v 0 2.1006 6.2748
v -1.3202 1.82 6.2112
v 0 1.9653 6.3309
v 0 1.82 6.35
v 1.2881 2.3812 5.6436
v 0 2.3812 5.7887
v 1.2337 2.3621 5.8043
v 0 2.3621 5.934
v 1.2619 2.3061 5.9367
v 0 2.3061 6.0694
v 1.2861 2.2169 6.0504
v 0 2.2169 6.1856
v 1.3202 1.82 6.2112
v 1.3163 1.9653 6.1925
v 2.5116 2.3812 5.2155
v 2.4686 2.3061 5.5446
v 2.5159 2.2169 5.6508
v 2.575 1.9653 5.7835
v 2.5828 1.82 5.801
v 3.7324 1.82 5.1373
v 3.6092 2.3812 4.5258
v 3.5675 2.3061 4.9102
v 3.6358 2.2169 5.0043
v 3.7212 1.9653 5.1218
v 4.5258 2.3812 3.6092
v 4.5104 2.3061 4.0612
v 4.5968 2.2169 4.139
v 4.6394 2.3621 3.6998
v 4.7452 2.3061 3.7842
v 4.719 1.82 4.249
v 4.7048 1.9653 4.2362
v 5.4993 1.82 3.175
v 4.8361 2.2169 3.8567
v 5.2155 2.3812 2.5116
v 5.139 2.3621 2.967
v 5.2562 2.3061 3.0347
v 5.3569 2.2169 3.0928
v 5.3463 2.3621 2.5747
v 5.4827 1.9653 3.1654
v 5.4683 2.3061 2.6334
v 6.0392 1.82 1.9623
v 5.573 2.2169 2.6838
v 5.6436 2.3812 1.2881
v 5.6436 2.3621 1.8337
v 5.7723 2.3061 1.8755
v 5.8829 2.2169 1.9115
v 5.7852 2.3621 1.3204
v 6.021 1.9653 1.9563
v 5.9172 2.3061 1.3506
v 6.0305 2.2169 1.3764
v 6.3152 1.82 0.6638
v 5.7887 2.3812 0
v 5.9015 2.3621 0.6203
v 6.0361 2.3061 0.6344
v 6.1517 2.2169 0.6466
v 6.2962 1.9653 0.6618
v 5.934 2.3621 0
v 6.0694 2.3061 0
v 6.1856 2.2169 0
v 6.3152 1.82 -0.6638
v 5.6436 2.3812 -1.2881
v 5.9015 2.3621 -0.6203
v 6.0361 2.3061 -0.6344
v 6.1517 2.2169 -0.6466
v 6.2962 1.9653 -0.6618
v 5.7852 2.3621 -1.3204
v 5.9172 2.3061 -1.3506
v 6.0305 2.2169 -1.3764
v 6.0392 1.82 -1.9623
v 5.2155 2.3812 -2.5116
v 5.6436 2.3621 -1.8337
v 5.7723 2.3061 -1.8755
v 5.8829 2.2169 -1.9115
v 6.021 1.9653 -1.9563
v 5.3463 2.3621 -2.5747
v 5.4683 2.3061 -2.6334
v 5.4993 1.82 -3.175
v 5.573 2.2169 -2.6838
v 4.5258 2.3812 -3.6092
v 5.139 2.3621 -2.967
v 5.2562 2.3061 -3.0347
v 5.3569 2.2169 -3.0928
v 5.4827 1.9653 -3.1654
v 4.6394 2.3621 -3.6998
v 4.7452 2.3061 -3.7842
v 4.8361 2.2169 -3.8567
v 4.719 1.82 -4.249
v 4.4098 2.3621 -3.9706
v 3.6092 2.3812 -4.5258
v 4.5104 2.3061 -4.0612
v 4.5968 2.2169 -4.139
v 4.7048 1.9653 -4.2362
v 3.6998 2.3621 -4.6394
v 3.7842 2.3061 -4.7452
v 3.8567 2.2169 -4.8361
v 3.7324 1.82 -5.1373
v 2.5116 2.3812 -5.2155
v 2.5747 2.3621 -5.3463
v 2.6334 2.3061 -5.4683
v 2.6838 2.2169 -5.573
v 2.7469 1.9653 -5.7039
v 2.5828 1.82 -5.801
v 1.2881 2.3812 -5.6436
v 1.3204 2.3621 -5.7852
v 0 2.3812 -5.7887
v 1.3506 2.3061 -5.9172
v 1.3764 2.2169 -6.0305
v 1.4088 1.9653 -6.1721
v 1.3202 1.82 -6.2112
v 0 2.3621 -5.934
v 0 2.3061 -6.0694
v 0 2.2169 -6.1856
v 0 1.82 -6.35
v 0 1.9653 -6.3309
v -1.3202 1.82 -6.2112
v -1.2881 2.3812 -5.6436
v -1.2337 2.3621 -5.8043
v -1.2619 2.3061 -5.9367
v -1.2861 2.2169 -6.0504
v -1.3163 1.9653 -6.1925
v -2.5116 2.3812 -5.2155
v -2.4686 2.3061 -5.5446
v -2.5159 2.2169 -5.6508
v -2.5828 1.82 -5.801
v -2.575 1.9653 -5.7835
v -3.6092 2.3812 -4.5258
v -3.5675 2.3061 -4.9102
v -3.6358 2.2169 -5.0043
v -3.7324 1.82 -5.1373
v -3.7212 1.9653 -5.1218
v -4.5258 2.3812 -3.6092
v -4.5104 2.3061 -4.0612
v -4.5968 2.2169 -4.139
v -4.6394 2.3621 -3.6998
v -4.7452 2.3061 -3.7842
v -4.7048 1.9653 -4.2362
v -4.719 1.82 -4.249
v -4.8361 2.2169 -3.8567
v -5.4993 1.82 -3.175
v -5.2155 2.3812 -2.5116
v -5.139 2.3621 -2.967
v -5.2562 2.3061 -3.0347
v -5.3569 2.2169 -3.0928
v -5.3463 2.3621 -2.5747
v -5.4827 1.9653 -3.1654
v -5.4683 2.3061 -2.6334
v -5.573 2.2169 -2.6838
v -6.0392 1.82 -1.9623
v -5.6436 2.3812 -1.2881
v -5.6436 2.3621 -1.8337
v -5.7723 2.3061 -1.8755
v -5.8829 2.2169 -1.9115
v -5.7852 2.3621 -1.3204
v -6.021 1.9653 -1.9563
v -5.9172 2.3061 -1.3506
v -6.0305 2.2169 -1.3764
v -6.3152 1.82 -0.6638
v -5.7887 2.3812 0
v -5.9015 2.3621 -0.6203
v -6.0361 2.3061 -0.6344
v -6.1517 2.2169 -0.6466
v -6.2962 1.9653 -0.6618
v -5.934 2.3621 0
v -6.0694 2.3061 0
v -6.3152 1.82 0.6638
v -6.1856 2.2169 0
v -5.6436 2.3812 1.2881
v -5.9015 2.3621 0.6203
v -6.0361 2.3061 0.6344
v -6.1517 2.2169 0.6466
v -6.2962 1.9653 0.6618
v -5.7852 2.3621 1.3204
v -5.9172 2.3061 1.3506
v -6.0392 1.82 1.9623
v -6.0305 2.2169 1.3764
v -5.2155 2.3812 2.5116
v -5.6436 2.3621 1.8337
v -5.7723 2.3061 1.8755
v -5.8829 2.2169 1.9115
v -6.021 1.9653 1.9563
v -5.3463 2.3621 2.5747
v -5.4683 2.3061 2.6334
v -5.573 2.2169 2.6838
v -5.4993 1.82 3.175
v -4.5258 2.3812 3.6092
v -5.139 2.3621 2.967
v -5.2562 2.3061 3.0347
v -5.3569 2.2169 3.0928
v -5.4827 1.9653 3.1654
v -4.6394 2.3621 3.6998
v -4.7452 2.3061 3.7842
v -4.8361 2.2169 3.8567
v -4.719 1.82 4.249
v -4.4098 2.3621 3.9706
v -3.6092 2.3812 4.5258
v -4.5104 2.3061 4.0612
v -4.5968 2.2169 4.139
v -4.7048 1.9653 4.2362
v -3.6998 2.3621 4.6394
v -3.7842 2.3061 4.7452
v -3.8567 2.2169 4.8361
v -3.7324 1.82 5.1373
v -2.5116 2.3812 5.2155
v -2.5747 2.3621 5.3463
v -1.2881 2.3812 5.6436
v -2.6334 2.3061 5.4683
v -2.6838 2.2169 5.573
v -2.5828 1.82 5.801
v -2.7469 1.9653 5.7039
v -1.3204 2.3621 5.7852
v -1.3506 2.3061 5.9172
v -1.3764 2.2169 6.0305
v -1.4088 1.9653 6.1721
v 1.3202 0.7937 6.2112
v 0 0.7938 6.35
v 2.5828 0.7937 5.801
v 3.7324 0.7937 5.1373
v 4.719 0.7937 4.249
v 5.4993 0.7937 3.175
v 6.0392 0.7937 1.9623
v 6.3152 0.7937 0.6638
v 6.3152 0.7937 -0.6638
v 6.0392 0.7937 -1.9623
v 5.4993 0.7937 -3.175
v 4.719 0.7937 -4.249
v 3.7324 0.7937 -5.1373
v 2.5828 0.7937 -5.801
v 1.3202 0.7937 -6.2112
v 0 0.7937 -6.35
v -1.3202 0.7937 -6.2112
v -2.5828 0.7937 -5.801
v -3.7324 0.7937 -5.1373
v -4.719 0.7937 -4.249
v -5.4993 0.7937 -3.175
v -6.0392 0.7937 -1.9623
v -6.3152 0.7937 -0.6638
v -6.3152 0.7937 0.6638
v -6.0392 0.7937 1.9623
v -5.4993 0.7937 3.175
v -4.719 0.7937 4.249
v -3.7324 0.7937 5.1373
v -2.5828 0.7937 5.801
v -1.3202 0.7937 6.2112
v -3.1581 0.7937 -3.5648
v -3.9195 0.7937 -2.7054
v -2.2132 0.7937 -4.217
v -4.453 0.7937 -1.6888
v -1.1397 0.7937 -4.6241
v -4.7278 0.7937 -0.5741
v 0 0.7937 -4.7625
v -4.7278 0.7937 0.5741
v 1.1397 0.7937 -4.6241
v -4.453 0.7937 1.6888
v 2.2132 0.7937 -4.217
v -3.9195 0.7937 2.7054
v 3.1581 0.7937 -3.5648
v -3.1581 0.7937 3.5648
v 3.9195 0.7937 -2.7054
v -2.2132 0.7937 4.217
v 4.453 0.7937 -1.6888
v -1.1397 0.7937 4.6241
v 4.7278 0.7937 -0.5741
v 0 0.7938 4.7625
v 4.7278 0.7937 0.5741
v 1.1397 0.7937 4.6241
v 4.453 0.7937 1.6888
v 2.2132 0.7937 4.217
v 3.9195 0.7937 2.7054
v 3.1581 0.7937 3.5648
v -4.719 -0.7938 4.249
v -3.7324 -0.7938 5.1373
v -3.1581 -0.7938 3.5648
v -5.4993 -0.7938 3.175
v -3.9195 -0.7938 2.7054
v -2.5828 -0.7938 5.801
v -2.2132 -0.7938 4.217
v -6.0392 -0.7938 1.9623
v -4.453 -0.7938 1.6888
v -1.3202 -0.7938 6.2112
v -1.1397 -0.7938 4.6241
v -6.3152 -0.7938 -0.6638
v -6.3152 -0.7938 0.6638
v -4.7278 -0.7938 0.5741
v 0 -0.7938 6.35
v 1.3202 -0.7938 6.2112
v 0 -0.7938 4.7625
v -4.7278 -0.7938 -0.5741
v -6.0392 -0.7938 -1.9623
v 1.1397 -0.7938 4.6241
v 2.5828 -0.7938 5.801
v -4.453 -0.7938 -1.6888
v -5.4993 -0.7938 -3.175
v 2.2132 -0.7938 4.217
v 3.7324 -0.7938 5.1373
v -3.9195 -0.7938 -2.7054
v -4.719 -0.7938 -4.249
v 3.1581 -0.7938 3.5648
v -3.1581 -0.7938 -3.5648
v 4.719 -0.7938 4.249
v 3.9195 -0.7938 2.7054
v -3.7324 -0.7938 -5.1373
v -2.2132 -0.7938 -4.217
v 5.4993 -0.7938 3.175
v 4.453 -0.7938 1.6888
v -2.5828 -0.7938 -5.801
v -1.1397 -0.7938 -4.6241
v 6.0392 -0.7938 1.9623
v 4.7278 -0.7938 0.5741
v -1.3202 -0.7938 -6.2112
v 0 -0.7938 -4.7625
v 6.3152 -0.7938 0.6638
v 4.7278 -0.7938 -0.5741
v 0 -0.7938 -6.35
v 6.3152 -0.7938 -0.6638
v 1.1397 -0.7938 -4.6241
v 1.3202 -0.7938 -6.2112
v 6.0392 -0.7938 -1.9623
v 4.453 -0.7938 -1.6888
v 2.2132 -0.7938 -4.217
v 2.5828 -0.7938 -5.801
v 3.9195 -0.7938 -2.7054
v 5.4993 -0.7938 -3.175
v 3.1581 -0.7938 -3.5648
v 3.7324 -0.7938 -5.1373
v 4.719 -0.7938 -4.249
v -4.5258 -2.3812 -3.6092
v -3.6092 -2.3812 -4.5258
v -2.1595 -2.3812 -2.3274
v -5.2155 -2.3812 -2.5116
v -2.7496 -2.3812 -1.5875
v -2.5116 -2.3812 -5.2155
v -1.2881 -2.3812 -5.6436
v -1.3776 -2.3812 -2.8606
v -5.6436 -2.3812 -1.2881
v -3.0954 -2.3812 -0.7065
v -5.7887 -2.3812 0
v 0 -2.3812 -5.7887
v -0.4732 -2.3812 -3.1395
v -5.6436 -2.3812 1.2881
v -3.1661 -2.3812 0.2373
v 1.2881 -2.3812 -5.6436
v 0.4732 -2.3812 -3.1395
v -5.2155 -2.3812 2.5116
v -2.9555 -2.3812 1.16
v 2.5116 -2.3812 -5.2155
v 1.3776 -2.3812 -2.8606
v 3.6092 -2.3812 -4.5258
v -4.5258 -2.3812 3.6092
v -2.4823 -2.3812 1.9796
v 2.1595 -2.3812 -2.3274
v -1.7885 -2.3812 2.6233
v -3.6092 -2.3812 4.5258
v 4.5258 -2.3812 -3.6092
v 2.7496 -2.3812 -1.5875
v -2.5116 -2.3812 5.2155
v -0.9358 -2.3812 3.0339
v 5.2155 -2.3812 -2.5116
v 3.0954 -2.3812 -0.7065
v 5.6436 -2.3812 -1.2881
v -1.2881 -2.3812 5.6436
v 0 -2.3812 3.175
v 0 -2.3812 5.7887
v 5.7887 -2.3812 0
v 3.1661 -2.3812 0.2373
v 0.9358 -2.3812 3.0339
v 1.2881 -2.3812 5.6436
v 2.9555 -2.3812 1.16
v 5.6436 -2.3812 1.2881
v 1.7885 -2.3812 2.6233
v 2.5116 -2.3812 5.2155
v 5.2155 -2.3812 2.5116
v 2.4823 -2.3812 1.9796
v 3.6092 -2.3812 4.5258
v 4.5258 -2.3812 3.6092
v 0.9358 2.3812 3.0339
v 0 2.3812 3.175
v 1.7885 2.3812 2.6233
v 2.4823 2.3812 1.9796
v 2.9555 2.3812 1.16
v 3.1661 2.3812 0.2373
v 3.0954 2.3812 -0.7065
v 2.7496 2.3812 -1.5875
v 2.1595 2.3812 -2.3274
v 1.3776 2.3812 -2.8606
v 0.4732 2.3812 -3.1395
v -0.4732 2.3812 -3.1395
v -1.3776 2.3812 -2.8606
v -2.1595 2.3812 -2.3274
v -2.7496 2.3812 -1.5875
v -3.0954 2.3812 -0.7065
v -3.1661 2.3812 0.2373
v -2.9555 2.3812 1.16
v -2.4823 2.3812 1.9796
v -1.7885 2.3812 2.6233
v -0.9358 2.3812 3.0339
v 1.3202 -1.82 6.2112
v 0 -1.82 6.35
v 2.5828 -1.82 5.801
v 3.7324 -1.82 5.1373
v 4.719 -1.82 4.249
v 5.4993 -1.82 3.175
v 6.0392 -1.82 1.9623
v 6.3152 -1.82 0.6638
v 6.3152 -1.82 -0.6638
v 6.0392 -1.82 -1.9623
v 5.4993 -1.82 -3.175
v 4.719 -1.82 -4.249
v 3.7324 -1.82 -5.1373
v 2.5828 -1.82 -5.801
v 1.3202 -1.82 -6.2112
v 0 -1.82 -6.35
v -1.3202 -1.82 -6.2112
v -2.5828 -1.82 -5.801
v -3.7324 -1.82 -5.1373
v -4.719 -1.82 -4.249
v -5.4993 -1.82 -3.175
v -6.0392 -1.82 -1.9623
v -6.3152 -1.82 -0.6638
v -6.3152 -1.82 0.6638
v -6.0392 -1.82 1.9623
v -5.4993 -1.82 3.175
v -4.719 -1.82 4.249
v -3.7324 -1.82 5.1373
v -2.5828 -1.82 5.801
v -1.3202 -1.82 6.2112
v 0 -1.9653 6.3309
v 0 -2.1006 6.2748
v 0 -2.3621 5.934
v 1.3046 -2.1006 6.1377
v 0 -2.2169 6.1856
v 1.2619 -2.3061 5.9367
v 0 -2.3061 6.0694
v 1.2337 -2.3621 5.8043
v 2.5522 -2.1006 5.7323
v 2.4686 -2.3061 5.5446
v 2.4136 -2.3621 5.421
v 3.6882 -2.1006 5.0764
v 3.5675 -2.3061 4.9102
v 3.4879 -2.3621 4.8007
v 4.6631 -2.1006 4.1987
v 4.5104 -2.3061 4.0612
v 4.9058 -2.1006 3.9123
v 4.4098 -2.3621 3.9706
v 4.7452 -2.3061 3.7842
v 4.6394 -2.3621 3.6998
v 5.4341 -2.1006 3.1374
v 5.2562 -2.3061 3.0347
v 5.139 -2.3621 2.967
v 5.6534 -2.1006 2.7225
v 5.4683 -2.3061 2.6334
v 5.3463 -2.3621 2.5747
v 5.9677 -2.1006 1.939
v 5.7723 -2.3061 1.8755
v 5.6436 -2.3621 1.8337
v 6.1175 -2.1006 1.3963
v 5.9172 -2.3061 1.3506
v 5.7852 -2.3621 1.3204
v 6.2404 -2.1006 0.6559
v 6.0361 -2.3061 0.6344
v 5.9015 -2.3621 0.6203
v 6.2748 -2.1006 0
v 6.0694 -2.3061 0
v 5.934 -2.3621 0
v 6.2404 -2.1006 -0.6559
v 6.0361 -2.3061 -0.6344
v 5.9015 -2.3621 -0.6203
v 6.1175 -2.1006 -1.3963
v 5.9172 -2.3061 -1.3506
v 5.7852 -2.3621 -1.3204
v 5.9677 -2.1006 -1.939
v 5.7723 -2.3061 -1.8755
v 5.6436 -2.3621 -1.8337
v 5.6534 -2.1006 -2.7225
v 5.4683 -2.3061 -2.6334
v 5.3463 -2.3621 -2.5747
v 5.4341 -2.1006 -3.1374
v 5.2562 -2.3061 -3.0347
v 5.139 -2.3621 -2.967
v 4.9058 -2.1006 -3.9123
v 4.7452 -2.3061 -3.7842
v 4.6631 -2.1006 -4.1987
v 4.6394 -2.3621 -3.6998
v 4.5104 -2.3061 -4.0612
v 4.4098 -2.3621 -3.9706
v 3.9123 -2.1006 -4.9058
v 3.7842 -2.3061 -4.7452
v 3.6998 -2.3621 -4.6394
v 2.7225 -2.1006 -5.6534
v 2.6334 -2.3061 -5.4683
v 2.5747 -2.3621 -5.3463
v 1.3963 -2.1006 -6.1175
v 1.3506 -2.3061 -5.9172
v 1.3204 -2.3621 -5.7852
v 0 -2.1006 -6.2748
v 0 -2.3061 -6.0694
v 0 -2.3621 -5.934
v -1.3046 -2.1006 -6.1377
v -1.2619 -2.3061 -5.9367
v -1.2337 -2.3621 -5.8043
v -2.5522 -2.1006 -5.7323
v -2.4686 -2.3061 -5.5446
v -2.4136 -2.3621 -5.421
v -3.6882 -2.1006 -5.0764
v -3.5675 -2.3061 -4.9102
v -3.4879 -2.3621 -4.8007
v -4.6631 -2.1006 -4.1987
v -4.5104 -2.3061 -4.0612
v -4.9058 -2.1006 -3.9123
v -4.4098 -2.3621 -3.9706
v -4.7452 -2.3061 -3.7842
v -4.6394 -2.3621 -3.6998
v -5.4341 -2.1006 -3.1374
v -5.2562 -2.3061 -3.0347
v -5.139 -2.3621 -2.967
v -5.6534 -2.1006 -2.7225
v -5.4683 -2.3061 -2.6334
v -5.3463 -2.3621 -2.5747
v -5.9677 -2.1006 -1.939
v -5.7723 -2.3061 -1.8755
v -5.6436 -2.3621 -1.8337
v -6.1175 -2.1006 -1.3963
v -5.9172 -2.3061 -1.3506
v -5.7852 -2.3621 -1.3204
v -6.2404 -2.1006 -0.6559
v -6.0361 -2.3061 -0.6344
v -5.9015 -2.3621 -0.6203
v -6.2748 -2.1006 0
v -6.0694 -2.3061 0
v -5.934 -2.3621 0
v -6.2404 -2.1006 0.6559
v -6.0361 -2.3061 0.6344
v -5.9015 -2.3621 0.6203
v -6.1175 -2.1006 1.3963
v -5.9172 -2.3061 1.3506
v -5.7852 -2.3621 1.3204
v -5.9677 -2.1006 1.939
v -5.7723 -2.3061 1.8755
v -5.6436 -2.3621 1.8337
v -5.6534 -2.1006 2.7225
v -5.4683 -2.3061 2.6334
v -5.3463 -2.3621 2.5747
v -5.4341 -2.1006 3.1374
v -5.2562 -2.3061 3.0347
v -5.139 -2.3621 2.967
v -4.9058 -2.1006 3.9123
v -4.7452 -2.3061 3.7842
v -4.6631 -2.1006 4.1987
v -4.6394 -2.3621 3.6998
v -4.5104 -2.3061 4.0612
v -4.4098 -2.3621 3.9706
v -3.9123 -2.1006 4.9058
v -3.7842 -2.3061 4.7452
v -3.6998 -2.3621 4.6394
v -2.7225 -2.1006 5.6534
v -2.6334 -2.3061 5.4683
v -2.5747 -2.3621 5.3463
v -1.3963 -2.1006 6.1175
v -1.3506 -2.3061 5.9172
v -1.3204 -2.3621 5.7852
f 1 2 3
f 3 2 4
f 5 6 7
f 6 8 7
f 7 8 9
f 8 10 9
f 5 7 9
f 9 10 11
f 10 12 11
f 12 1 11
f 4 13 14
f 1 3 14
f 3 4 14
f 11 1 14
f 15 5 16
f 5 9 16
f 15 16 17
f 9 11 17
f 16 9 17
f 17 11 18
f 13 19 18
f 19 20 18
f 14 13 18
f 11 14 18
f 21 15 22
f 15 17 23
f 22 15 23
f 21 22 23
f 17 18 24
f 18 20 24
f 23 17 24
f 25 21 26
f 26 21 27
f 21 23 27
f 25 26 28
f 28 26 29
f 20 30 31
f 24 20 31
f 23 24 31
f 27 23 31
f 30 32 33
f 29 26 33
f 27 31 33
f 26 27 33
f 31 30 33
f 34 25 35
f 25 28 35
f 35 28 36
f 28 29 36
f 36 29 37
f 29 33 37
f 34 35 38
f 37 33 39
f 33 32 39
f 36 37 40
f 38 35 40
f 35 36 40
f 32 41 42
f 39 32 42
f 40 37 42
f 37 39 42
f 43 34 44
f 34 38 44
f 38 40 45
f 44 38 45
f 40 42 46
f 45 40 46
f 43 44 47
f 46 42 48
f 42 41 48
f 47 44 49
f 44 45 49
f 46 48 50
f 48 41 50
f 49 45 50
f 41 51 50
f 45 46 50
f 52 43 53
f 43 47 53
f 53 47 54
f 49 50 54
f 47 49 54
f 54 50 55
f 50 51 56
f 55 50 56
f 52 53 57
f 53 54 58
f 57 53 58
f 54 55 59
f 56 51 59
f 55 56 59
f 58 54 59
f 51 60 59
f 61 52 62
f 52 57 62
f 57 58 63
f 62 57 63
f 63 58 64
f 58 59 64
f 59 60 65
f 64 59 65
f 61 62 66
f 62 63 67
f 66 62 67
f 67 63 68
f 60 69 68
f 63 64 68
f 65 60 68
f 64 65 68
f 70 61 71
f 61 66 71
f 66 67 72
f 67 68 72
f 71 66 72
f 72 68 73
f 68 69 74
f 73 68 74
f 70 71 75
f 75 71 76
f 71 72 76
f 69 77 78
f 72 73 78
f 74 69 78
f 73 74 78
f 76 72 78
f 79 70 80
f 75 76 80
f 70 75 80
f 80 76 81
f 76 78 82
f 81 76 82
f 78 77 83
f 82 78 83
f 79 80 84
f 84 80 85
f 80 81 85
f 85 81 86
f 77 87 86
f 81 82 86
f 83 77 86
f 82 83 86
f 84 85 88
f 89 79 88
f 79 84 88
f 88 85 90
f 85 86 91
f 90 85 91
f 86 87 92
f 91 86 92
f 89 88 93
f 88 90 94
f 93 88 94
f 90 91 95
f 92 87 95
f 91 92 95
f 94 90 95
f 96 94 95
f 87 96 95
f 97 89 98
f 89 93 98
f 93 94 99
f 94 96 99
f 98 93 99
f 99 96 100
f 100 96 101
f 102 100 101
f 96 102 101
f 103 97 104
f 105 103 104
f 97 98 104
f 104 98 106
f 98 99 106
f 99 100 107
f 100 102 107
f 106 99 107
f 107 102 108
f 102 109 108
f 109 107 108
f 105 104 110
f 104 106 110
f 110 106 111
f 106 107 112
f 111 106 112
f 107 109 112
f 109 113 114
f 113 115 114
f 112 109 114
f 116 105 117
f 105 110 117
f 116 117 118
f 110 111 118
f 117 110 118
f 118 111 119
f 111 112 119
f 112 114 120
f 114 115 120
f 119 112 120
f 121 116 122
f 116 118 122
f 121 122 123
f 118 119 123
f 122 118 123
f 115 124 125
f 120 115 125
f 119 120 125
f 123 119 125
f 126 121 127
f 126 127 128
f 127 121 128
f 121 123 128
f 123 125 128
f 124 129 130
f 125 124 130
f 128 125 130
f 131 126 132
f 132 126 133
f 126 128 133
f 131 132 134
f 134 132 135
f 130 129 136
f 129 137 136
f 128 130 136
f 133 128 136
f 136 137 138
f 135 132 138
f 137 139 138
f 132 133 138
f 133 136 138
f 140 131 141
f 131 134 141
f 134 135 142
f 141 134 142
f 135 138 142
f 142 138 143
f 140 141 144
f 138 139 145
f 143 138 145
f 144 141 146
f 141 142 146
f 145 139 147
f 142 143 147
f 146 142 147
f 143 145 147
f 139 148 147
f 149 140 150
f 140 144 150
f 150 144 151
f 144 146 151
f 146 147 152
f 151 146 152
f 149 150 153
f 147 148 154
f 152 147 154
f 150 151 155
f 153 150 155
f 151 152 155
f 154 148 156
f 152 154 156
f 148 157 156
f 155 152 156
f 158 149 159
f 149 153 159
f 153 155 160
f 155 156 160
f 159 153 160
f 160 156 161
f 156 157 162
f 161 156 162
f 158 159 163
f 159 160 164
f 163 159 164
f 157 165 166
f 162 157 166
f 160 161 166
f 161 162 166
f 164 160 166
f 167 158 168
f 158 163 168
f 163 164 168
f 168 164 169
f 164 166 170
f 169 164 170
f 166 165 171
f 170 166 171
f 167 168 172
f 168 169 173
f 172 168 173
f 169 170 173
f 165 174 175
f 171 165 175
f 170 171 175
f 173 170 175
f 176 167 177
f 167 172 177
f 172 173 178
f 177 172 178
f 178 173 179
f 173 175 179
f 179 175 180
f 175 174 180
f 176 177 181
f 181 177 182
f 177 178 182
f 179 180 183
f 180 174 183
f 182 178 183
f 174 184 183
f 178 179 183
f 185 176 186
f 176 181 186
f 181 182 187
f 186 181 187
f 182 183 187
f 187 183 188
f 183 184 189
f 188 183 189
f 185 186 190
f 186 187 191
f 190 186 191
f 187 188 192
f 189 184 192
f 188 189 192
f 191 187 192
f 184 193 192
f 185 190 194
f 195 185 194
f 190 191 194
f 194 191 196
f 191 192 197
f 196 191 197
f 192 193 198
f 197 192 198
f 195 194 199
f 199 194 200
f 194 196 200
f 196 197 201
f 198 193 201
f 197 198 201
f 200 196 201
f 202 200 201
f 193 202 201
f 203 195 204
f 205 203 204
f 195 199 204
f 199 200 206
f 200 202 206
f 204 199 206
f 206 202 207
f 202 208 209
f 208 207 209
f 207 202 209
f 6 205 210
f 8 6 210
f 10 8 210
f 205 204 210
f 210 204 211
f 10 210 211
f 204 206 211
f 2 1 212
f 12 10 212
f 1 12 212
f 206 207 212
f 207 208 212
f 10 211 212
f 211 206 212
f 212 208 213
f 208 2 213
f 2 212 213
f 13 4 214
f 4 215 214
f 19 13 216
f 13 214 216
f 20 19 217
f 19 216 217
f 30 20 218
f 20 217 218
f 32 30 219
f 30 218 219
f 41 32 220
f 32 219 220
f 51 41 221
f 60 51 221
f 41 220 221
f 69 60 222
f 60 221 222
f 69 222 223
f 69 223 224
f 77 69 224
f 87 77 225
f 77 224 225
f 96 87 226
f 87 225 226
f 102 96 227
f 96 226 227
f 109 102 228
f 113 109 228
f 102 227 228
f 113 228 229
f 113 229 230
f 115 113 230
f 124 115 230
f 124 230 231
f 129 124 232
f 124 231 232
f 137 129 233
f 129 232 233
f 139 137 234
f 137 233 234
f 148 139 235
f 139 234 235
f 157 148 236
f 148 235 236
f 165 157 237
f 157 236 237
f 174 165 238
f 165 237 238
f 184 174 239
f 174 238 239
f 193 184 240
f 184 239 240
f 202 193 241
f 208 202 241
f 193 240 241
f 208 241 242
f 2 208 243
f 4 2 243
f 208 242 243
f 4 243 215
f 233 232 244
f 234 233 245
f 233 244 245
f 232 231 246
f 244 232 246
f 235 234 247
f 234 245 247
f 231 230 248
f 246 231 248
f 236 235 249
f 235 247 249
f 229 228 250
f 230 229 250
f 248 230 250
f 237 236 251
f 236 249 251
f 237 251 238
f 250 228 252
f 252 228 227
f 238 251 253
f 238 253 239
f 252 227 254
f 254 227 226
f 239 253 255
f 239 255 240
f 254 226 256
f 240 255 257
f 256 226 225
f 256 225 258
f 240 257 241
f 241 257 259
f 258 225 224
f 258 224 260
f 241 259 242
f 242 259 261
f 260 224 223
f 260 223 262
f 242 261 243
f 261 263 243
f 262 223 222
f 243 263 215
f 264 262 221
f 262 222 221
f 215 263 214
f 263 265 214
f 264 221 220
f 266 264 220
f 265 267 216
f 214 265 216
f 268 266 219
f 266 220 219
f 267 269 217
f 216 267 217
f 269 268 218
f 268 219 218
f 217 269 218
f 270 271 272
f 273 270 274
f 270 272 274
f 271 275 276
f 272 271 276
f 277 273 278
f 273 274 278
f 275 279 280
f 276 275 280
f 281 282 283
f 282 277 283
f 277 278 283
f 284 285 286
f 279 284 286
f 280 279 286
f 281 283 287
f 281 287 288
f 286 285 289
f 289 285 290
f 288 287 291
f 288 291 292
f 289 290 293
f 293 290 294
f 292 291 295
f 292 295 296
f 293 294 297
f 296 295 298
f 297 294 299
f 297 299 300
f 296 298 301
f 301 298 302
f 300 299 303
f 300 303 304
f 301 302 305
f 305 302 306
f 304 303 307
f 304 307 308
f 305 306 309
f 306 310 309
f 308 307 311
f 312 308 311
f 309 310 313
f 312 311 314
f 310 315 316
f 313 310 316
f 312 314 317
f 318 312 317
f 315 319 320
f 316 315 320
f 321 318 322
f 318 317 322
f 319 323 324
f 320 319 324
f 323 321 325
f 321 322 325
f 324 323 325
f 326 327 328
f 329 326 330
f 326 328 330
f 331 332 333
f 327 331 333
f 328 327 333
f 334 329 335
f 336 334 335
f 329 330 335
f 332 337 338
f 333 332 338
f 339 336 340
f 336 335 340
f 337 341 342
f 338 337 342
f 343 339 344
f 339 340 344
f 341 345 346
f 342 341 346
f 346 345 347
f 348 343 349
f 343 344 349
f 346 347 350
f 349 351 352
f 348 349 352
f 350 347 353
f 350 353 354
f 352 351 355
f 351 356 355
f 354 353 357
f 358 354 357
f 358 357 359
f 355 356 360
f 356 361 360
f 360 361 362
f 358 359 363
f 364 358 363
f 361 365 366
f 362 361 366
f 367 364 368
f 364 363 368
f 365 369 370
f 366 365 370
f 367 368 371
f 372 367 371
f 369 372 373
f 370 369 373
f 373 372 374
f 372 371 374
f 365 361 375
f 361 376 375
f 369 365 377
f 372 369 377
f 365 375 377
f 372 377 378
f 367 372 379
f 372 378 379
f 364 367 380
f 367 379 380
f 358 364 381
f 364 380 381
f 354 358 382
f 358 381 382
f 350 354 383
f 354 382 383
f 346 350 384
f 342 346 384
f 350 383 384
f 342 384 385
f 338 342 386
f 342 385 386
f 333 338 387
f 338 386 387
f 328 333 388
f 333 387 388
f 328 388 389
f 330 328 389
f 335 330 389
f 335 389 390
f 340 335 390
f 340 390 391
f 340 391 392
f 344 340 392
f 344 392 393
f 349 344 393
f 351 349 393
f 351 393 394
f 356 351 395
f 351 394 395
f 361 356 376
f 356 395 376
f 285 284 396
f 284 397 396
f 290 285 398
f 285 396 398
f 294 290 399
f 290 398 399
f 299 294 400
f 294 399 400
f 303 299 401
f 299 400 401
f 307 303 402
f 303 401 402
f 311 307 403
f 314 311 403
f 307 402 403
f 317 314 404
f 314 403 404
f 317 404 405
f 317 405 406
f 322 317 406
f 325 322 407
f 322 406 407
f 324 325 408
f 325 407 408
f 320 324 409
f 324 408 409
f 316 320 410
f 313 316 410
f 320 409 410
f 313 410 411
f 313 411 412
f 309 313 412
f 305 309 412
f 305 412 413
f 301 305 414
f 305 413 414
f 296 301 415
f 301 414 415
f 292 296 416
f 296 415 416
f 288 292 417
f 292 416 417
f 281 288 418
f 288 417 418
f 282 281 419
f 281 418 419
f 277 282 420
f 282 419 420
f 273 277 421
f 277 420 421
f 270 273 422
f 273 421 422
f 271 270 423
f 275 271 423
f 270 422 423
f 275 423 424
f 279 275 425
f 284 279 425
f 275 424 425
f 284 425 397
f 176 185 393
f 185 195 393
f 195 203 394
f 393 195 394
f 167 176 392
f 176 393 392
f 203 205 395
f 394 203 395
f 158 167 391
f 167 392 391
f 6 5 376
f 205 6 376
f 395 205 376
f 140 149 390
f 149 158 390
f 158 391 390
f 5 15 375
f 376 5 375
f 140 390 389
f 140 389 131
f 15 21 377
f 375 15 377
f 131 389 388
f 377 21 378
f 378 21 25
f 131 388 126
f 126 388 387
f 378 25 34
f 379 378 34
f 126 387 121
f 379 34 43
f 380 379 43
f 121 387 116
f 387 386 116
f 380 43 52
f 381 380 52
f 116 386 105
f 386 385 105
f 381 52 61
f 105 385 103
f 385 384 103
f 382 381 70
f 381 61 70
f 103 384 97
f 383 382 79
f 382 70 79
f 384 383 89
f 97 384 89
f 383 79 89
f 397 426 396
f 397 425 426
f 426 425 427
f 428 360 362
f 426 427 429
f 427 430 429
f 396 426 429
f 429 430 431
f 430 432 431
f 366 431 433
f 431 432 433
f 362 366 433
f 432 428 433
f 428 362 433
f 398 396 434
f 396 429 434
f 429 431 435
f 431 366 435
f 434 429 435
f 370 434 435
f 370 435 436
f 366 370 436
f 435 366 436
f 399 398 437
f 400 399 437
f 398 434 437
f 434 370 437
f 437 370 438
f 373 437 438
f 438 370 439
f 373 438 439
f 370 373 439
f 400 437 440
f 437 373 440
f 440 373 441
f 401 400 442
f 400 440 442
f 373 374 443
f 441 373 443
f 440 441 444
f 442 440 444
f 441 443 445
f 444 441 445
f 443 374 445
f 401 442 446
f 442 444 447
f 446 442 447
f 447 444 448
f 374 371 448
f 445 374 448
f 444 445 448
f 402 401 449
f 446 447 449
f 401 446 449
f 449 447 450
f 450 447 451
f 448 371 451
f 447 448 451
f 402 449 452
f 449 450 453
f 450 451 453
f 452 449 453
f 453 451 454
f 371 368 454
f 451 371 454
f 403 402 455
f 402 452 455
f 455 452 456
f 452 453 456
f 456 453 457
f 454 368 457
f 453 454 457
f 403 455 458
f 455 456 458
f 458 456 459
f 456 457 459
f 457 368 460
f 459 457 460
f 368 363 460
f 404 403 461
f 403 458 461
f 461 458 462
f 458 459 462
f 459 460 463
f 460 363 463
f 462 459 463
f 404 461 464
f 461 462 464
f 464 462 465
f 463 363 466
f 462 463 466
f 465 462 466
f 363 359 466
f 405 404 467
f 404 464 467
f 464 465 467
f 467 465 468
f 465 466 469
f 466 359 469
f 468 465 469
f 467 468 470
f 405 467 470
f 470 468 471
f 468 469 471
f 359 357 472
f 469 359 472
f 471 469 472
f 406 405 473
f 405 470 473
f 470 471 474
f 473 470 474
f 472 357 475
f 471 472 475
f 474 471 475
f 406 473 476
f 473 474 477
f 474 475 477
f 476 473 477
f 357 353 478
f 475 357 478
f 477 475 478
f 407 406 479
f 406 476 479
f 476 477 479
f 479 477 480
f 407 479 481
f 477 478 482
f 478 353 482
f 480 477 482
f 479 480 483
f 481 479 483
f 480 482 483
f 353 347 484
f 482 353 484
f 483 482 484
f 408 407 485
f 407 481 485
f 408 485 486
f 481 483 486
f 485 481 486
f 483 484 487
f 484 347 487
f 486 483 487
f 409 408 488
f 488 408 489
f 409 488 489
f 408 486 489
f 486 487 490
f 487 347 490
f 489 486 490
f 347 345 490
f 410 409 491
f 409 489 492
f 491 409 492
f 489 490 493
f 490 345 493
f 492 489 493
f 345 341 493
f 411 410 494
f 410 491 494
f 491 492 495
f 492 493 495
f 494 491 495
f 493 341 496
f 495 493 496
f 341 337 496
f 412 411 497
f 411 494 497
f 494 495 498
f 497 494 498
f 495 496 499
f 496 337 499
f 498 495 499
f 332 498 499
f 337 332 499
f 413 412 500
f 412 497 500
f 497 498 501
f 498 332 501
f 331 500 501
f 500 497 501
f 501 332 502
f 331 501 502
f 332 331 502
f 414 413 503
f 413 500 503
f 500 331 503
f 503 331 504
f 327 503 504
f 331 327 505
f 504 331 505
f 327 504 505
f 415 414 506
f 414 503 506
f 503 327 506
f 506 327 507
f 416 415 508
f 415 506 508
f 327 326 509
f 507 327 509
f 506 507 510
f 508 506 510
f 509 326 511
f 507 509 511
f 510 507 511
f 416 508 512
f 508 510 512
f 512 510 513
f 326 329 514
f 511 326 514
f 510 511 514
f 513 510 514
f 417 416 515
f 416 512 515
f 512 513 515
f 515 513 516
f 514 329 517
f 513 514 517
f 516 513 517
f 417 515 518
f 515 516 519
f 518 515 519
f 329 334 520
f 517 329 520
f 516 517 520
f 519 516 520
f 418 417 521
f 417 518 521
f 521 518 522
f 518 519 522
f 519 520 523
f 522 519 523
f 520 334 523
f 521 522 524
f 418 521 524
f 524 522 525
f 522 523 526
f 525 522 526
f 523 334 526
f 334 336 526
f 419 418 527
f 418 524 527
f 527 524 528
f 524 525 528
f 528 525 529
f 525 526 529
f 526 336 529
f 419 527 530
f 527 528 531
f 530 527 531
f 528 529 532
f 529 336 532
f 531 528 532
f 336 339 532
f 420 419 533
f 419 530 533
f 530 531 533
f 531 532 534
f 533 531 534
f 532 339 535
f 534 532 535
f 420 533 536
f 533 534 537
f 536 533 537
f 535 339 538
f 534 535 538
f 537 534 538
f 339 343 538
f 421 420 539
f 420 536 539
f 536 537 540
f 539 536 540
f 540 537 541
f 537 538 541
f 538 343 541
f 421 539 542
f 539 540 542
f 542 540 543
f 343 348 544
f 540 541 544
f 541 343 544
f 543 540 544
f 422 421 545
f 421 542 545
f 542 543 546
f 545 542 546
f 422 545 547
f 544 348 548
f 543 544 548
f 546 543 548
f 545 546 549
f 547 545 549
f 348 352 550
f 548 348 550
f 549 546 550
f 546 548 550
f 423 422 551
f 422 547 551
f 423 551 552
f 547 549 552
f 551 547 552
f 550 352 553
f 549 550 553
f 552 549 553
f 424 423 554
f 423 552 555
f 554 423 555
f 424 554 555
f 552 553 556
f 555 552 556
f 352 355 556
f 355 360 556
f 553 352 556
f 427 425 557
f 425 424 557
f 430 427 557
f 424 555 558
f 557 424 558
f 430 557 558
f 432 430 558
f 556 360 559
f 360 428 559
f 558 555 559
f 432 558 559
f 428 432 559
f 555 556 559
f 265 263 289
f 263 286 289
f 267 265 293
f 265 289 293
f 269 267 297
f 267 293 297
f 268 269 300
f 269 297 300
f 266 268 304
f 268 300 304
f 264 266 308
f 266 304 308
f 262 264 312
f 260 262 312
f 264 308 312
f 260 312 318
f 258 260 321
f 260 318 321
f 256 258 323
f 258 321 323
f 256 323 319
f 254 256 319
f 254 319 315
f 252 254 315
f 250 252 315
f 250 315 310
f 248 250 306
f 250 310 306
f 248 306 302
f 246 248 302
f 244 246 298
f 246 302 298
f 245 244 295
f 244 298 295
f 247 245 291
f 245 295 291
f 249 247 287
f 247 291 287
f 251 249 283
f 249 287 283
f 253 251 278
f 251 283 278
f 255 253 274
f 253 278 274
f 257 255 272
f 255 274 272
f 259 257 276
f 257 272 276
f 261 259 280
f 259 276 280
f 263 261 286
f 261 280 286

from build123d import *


with BuildPart() as part:
    # Sketch15 → Revolve4 (revolve)
    with BuildSketch(Plane.XY, mode=Mode.PRIVATE) as revolve4_sk:
        with BuildLine():
            Line((-3.175, -2.38125), (-3.175, 2.38125))
            Line((-3.175, 2.38125), (-5.788733992, 2.38125))
            ThreePointArc((-5.788733992, 2.38125), (-6.185608992, 2.216858992), (-6.35, 1.819983992))
            Line((-6.35, 1.819983992), (-6.35, 0.79375))
            Line((-6.35, 0.79375), (-4.7625, 0.79375))
            Line((-4.7625, 0.79375), (-4.7625, -0.79375))
            Line((-4.7625, -0.79375), (-6.35, -0.79375))
            Line((-6.35, -0.79375), (-6.35, -1.819983992))
            ThreePointArc((-6.35, -1.819983992), (-6.185608992, -2.216858992), (-5.788733992, -2.38125))
            Line((-5.788733992, -2.38125), (-3.175, -2.38125))
        make_face()
    revolve(revolve4_sk.sketch.rotate(Axis((0, -2.38125, 0), (0, 1, 0)), 90), axis=Axis((0, -2.38125, 0), (0, 1, 0)))


solid = part.part
